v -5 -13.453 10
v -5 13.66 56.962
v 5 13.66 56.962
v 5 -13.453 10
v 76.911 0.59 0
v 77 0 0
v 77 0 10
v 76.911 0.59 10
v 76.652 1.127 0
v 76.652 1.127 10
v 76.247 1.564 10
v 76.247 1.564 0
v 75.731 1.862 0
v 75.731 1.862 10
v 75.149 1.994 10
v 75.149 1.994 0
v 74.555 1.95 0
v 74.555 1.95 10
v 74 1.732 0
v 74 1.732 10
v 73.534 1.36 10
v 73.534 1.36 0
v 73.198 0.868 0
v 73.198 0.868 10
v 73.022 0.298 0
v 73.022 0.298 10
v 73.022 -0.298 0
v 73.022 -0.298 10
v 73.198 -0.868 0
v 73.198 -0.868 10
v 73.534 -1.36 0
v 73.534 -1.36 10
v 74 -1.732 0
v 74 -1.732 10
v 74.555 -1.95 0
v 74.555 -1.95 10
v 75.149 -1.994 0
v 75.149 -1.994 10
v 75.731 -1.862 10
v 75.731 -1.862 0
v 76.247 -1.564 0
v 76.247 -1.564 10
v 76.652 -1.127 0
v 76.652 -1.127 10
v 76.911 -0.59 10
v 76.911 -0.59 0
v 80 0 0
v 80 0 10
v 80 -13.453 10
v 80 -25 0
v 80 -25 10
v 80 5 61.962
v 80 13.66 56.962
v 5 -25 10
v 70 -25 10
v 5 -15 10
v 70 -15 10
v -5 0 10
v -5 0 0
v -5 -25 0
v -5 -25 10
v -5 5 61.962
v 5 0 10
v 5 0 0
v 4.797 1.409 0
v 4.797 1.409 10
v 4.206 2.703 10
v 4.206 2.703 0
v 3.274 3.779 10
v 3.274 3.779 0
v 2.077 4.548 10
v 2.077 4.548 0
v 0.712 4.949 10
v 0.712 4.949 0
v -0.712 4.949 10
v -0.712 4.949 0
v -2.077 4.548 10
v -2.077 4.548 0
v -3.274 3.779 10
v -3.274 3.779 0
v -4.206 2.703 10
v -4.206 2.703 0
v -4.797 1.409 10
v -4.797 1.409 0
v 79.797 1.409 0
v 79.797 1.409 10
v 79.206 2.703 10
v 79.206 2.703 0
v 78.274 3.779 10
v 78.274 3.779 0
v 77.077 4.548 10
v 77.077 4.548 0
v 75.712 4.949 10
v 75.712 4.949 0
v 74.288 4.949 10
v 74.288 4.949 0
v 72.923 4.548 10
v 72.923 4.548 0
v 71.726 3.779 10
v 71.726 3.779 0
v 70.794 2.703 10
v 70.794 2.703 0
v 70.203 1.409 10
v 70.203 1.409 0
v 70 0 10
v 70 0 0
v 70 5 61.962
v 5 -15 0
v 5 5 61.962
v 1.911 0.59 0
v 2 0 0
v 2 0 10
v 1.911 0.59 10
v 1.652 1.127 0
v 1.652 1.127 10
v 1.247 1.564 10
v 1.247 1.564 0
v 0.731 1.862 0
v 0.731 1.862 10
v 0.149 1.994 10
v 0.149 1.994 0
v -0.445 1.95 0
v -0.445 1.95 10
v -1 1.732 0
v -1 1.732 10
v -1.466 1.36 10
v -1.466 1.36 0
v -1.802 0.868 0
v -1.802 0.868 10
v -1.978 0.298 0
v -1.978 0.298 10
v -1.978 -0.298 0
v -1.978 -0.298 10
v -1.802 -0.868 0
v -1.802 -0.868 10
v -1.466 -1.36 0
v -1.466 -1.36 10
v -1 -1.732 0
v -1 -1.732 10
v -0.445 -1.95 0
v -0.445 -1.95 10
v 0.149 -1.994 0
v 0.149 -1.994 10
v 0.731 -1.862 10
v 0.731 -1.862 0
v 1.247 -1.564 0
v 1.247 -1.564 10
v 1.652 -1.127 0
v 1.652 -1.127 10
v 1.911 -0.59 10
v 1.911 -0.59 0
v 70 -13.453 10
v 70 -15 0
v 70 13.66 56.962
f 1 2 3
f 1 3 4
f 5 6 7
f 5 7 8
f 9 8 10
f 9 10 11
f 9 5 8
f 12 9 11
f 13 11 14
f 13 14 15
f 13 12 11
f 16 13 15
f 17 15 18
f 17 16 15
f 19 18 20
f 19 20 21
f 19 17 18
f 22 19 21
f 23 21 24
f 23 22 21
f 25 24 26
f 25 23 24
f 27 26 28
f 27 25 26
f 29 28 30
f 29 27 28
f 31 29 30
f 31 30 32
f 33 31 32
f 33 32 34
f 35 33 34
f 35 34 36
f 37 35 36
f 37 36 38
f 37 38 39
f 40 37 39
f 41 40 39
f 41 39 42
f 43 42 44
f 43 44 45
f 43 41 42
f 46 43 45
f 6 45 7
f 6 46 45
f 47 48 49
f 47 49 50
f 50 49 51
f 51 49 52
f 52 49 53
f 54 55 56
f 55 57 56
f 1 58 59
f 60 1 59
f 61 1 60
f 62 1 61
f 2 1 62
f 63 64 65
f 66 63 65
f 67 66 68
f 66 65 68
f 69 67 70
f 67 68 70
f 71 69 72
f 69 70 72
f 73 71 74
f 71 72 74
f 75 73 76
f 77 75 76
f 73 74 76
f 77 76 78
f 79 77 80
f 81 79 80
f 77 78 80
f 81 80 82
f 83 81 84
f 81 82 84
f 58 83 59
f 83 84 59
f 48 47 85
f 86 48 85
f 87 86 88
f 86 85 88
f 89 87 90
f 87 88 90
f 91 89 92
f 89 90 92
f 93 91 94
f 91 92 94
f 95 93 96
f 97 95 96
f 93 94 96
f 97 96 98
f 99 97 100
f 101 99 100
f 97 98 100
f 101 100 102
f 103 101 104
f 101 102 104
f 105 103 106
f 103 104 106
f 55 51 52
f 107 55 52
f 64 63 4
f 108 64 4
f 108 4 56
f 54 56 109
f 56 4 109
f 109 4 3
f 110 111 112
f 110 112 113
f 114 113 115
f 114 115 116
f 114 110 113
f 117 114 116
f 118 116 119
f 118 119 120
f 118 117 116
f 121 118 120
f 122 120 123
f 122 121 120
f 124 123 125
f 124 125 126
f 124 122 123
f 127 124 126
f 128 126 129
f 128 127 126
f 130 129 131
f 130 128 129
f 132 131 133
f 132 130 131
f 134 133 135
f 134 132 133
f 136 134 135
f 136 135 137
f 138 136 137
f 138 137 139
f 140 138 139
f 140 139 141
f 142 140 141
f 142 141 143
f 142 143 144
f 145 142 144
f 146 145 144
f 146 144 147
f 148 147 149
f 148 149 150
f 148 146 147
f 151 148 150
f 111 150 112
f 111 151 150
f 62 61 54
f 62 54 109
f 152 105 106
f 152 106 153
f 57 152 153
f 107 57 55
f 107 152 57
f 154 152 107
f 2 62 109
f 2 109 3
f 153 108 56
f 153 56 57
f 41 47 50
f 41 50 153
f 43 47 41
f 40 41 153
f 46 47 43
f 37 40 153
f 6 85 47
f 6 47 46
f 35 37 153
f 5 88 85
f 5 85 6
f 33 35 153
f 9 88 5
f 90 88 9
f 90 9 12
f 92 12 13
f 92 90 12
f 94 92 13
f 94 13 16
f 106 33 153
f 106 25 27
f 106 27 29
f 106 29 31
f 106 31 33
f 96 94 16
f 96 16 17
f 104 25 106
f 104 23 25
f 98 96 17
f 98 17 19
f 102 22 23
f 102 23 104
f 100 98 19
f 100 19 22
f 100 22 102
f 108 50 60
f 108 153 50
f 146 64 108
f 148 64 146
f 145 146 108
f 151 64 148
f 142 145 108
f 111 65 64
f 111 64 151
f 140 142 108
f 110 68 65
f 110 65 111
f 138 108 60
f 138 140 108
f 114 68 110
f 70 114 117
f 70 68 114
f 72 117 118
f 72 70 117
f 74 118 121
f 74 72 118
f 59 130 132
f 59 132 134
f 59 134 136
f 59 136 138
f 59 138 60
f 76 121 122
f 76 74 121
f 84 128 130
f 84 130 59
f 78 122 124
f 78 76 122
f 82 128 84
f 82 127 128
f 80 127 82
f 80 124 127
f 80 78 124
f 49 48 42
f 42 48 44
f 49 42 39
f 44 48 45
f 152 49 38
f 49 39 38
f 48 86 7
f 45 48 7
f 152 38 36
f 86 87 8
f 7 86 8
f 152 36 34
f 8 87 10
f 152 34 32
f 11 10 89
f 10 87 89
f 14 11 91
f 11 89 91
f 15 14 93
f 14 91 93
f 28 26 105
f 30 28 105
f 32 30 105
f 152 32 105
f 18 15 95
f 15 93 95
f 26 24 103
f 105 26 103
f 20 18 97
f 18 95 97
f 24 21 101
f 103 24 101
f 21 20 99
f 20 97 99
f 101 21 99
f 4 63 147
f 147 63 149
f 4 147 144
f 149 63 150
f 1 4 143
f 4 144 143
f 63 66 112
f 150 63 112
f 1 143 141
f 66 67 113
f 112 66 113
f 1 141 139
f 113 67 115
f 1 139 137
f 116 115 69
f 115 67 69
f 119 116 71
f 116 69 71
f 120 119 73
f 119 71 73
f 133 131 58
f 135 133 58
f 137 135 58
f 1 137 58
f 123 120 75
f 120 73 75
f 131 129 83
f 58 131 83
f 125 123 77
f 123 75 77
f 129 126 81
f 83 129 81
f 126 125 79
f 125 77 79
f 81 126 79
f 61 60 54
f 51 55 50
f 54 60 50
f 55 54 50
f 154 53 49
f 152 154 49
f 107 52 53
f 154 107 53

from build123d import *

# Parameters (mm, degrees)
SKETCH_R     = 2
PAD_DEPTH    = 10
PAD001_DEPTH = 10
PAD002_DEPTH = 10


with BuildPart() as part:
    # Sketch → Pad (new body)
    with BuildSketch(Plane.XY):
        with BuildLine():
            Line((-5, -25), (-5, 0))
            ThreePointArc((5, 0), (0, 5), (-5, 0))
            Line((5, 0), (5, -15))
            Line((5, -15), (70, -15))
            Line((70, -15), (70, 0))
            ThreePointArc((80, 0), (75, 5), (70, 0))
            Line((80, 0), (80, -25))
            Line((-5, -25), (80, -25))
        make_face()
        Circle(SKETCH_R, mode=Mode.SUBTRACT)
        with Locations((75, 0)):
            Circle(SKETCH_R, mode=Mode.SUBTRACT)
    extrude(amount=PAD_DEPTH)

    # Sketch001 (on Face1 of Pad) → Pad001 (join)
    with BuildSketch(Plane(origin=(-5, 0, 0), x_dir=(0, -1, 0), z_dir=(-1, 0, 0))):
        Polygon((25, 10), (-5, 61.961524), (-13.660254, 56.961524), (13.452995, 10), align=None)
    extrude(amount=-PAD001_DEPTH)

    # Sketch002 (on Face7 of Pad) → Pad002 (join)
    with BuildSketch(Plane.YZ.offset(80)):
        Polygon((-25, 10), (5, 61.961524), (13.660254, 56.961524), (-13.452995, 10), align=None)
    extrude(amount=-PAD002_DEPTH)


solid = part.part
